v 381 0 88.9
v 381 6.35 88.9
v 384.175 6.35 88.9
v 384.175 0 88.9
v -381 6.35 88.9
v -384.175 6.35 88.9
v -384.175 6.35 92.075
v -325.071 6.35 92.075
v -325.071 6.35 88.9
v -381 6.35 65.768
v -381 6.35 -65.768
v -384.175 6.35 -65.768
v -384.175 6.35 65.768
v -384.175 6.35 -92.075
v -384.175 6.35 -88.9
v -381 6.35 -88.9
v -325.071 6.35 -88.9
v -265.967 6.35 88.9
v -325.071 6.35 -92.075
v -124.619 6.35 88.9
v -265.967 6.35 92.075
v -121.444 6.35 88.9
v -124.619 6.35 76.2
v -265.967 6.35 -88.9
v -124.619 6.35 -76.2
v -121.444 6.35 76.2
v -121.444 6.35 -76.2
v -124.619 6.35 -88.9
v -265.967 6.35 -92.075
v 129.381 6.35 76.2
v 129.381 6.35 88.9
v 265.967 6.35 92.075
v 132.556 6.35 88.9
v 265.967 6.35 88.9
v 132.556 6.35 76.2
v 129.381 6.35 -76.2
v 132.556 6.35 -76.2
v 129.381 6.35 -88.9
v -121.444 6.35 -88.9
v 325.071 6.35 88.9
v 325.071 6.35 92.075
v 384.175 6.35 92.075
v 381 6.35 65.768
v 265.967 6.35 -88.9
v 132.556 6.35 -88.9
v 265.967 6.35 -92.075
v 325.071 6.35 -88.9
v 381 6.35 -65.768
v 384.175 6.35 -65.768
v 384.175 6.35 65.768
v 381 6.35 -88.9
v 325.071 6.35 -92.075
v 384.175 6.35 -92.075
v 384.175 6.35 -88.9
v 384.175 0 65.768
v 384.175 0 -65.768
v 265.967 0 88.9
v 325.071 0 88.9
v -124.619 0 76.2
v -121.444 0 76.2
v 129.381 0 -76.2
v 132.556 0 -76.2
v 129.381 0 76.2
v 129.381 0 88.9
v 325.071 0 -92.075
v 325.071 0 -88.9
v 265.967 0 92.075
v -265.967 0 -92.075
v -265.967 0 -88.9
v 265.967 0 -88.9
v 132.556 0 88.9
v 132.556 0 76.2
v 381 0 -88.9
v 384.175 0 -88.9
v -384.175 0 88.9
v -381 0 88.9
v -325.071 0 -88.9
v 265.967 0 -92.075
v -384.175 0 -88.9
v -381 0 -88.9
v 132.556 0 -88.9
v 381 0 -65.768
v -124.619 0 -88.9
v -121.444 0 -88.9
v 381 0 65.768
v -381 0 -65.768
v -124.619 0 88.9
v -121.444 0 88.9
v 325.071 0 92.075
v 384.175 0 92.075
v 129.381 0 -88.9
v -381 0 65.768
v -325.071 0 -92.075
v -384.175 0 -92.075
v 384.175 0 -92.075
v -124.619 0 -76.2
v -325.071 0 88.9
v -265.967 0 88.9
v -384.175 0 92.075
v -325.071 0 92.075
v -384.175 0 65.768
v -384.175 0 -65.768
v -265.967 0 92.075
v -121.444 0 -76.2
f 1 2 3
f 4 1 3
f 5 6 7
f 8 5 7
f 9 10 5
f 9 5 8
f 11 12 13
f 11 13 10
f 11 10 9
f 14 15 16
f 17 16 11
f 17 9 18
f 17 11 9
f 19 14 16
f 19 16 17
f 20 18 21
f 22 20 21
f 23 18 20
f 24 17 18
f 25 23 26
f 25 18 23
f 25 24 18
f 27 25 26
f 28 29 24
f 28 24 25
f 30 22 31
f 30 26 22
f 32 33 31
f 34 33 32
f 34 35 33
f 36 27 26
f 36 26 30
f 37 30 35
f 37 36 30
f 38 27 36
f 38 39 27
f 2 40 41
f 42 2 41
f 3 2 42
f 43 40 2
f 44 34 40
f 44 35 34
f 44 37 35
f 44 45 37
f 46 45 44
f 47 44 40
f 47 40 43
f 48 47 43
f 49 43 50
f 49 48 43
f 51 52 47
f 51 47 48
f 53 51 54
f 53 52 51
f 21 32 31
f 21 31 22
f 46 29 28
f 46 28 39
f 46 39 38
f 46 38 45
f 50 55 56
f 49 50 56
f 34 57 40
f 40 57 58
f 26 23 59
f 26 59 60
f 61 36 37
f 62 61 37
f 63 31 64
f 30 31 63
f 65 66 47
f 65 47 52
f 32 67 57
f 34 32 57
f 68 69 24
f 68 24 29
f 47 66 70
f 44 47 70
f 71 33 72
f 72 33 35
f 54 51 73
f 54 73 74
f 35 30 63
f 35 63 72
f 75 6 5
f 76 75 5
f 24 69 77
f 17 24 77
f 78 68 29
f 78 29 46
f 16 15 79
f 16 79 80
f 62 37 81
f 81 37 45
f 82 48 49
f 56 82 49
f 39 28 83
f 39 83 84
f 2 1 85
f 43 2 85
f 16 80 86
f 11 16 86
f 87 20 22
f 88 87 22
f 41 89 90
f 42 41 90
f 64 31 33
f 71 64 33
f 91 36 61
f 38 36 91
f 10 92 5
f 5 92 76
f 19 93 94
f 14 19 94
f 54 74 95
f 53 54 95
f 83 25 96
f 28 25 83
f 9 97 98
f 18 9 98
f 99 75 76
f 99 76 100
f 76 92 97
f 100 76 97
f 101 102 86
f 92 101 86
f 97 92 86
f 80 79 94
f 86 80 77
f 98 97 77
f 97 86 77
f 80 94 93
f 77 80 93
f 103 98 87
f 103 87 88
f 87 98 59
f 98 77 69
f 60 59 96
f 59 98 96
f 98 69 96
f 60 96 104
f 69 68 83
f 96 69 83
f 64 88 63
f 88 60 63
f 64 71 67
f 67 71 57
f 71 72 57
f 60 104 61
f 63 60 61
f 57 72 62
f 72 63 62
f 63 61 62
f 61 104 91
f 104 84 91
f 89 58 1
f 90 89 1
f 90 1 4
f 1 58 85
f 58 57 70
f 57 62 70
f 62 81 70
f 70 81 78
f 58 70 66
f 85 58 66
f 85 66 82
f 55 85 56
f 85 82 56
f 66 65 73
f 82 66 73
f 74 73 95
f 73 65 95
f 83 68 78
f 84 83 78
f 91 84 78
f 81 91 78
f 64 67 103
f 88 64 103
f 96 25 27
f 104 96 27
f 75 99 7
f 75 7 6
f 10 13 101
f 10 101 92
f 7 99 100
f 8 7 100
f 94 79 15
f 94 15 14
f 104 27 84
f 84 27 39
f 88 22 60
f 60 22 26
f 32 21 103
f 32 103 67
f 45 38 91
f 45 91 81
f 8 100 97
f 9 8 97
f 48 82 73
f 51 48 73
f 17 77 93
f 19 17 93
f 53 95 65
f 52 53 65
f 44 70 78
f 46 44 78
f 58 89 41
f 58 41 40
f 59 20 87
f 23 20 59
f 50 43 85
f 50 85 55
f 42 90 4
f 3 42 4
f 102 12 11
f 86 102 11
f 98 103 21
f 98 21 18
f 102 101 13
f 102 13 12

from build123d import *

# Parameters (mm, degrees)
SKETCH1_W           = 55.928846154
SKETCH1_H           = 3.175
SKETCH1_W_2         = 3.175
SKETCH1_W_3         = 59.103846154
SKETCH1_H_2         = 26.307142857
SKETCH1_H_3         = 26.307142858
BOSS_EXTRUDE1_DEPTH = 6.35
SKETCH2_W           = 3.175
SKETCH2_H           = 12.7
CUT_EXTRUDE1_DEPTH  = 396.105756412
SKETCH3_W           = 59.103846153
SKETCH3_H           = 3.175
SKETCH3_W_2         = 59.103846154
SKETCH3_W_3         = 3.175
SKETCH3_H_2         = 26.307142857
BOSS_EXTRUDE2_DEPTH = 6.35


with BuildPart() as part:
    # Sketch1 → Boss-Extrude1 (new body)
    with BuildSketch(Plane(origin=(0, 0, 0), x_dir=(1, 0, 0), z_dir=(0, 1, 0))):
        Polygon((0, -88.9), (0, 88.9), (-29.551923077, 88.9), (-88.655769231, 88.9), (-147.759615385, 88.9), (-206.863461538, 88.9), (-265.967307692, 88.9), (-325.071153846, 88.9), (-381, 88.9), (-381, 65.767857143), (-381, 39.460714286), (-381, 13.153571429), (-381, -13.153571429), (-381, -39.460714286), (-381, -65.767857143), (-381, -88.9), (-325.071153846, -88.9), (-265.967307692, -88.9), (-206.863461538, -88.9), (-147.759615385, -88.9), (-88.655769231, -88.9), (-29.551923077, -88.9), align=None)
        Polygon((29.551923077, 88.9), (0, 88.9), (0, -88.9), (29.551923077, -88.9), (88.655769231, -88.9), (147.759615385, -88.9), (206.863461538, -88.9), (265.967307692, -88.9), (325.071153846, -88.9), (381, -88.9), (381, -65.767857143), (381, -39.460714286), (381, -13.153571429), (381, 13.153571429), (381, 39.460714286), (381, 65.767857143), (381, 88.9), (325.071153846, 88.9), (265.967307692, 88.9), (206.863461538, 88.9), (147.759615385, 88.9), (88.655769231, 88.9), align=None)
        with Locations((-353.035576923, -90.4875)):
            Rectangle(SKETCH1_W, SKETCH1_H)
        with Locations((-382.5875, -90.4875)):
            Rectangle(SKETCH1_W_2, SKETCH1_H)
        with Locations((-236.415384615, -90.4875)):
            Rectangle(SKETCH1_W_3, SKETCH1_H)
        with Locations((-382.5875, -52.614285714)):
            Rectangle(SKETCH1_W_2, SKETCH1_H_2)
        with Locations((-118.207692308, -90.4875)):
            Rectangle(SKETCH1_W_3, SKETCH1_H)
        with Locations((-382.5875, 0)):
            Rectangle(SKETCH1_W_2, SKETCH1_H_3)
        with Locations((-382.5875, 52.614285714)):
            Rectangle(SKETCH1_W_2, SKETCH1_H_2)
        with Locations((-382.5875, 90.4875)):
            Rectangle(SKETCH1_W_2, SKETCH1_H)
        with Locations((-353.035576923, 90.4875)):
            Rectangle(SKETCH1_W, SKETCH1_H)
        with Locations((-236.415384615, 90.4875)):
            Rectangle(SKETCH1_W_3, SKETCH1_H)
        with Locations((-118.207692308, 90.4875)):
            Rectangle(SKETCH1_W_3, SKETCH1_H)
        Polygon((-29.551923077, 88.9), (0, 88.9), (29.551923077, 88.9), (29.551923077, 92.075), (-29.551923077, 92.075), align=None)
        with Locations((118.207692308, 90.4875)):
            Rectangle(SKETCH1_W_3, SKETCH1_H)
        Polygon((29.551923077, -88.9), (0, -88.9), (-29.551923077, -88.9), (-29.551923077, -92.075), (29.551923077, -92.075), align=None)
        with Locations((118.207692308, -90.4875)):
            Rectangle(SKETCH1_W_3, SKETCH1_H)
        with Locations((236.415384615, -90.4875)):
            Rectangle(SKETCH1_W_3, SKETCH1_H)
        with Locations((236.415384615, 90.4875)):
            Rectangle(SKETCH1_W_3, SKETCH1_H)
        with Locations((382.5875, 90.4875)):
            Rectangle(SKETCH1_W_2, SKETCH1_H)
        with Locations((382.5875, 52.614285714)):
            Rectangle(SKETCH1_W_2, SKETCH1_H_2)
        with Locations((382.5875, 0)):
            Rectangle(SKETCH1_W_2, SKETCH1_H_3)
        with Locations((382.5875, -52.614285714)):
            Rectangle(SKETCH1_W_2, SKETCH1_H_2)
        with Locations((382.5875, -90.4875)):
            Rectangle(SKETCH1_W_2, SKETCH1_H)
        with Locations((354.623076923, -90.4875)):
            Rectangle(SKETCH1_W_3, SKETCH1_H)
        with Locations((354.623076923, 90.4875)):
            Rectangle(SKETCH1_W_3, SKETCH1_H)
    extrude(amount=BOSS_EXTRUDE1_DEPTH)

    # Sketch2 → Cut-Extrude1 (cut, through all)
    with BuildSketch(Plane(origin=(0, 6.35, 0), x_dir=(1, 0, 0), z_dir=(0, 1, 0))):
        with Locations((-123.03125, 82.55)):
            Rectangle(SKETCH2_W, SKETCH2_H)
        with Locations((-123.03125, -82.55)):
            Rectangle(SKETCH2_W, SKETCH2_H)
        with Locations((130.96875, 82.55)):
            Rectangle(SKETCH2_W, SKETCH2_H)
        with Locations((130.96875, -82.55)):
            Rectangle(SKETCH2_W, SKETCH2_H)
    extrude(amount=-CUT_EXTRUDE1_DEPTH, mode=Mode.SUBTRACT)

    # Sketch3 → Boss-Extrude2 (add)
    with BuildSketch(Plane(origin=(0, 6.35, 0), x_dir=(1, 0, 0), z_dir=(0, 1, 0))):
        with Locations((-177.311538462, -90.4875)):
            Rectangle(SKETCH3_W, SKETCH3_H)
        with Locations((-59.103846154, -90.4875)):
            Rectangle(SKETCH3_W_2, SKETCH3_H)
        with Locations((59.103846154, -90.4875)):
            Rectangle(SKETCH3_W_2, SKETCH3_H)
        with Locations((177.311538462, -90.4875)):
            Rectangle(SKETCH3_W, SKETCH3_H)
        with Locations((382.5875, -26.307142858)):
            Rectangle(SKETCH3_W_3, SKETCH3_H_2)
        with Locations((382.5875, 26.307142858)):
            Rectangle(SKETCH3_W_3, SKETCH3_H_2)
        with Locations((-382.5875, -26.307142858)):
            Rectangle(SKETCH3_W_3, SKETCH3_H_2)
        with Locations((-382.5875, 26.307142858)):
            Rectangle(SKETCH3_W_3, SKETCH3_H_2)
        with Locations((-177.311538462, 90.4875)):
            Rectangle(SKETCH3_W, SKETCH3_H)
        with Locations((-59.103846154, 90.4875)):
            Rectangle(SKETCH3_W_2, SKETCH3_H)
        with Locations((59.103846154, 90.4875)):
            Rectangle(SKETCH3_W_2, SKETCH3_H)
        with Locations((177.311538462, 90.4875)):
            Rectangle(SKETCH3_W, SKETCH3_H)
    extrude(amount=-BOSS_EXTRUDE2_DEPTH)


solid = part.part
